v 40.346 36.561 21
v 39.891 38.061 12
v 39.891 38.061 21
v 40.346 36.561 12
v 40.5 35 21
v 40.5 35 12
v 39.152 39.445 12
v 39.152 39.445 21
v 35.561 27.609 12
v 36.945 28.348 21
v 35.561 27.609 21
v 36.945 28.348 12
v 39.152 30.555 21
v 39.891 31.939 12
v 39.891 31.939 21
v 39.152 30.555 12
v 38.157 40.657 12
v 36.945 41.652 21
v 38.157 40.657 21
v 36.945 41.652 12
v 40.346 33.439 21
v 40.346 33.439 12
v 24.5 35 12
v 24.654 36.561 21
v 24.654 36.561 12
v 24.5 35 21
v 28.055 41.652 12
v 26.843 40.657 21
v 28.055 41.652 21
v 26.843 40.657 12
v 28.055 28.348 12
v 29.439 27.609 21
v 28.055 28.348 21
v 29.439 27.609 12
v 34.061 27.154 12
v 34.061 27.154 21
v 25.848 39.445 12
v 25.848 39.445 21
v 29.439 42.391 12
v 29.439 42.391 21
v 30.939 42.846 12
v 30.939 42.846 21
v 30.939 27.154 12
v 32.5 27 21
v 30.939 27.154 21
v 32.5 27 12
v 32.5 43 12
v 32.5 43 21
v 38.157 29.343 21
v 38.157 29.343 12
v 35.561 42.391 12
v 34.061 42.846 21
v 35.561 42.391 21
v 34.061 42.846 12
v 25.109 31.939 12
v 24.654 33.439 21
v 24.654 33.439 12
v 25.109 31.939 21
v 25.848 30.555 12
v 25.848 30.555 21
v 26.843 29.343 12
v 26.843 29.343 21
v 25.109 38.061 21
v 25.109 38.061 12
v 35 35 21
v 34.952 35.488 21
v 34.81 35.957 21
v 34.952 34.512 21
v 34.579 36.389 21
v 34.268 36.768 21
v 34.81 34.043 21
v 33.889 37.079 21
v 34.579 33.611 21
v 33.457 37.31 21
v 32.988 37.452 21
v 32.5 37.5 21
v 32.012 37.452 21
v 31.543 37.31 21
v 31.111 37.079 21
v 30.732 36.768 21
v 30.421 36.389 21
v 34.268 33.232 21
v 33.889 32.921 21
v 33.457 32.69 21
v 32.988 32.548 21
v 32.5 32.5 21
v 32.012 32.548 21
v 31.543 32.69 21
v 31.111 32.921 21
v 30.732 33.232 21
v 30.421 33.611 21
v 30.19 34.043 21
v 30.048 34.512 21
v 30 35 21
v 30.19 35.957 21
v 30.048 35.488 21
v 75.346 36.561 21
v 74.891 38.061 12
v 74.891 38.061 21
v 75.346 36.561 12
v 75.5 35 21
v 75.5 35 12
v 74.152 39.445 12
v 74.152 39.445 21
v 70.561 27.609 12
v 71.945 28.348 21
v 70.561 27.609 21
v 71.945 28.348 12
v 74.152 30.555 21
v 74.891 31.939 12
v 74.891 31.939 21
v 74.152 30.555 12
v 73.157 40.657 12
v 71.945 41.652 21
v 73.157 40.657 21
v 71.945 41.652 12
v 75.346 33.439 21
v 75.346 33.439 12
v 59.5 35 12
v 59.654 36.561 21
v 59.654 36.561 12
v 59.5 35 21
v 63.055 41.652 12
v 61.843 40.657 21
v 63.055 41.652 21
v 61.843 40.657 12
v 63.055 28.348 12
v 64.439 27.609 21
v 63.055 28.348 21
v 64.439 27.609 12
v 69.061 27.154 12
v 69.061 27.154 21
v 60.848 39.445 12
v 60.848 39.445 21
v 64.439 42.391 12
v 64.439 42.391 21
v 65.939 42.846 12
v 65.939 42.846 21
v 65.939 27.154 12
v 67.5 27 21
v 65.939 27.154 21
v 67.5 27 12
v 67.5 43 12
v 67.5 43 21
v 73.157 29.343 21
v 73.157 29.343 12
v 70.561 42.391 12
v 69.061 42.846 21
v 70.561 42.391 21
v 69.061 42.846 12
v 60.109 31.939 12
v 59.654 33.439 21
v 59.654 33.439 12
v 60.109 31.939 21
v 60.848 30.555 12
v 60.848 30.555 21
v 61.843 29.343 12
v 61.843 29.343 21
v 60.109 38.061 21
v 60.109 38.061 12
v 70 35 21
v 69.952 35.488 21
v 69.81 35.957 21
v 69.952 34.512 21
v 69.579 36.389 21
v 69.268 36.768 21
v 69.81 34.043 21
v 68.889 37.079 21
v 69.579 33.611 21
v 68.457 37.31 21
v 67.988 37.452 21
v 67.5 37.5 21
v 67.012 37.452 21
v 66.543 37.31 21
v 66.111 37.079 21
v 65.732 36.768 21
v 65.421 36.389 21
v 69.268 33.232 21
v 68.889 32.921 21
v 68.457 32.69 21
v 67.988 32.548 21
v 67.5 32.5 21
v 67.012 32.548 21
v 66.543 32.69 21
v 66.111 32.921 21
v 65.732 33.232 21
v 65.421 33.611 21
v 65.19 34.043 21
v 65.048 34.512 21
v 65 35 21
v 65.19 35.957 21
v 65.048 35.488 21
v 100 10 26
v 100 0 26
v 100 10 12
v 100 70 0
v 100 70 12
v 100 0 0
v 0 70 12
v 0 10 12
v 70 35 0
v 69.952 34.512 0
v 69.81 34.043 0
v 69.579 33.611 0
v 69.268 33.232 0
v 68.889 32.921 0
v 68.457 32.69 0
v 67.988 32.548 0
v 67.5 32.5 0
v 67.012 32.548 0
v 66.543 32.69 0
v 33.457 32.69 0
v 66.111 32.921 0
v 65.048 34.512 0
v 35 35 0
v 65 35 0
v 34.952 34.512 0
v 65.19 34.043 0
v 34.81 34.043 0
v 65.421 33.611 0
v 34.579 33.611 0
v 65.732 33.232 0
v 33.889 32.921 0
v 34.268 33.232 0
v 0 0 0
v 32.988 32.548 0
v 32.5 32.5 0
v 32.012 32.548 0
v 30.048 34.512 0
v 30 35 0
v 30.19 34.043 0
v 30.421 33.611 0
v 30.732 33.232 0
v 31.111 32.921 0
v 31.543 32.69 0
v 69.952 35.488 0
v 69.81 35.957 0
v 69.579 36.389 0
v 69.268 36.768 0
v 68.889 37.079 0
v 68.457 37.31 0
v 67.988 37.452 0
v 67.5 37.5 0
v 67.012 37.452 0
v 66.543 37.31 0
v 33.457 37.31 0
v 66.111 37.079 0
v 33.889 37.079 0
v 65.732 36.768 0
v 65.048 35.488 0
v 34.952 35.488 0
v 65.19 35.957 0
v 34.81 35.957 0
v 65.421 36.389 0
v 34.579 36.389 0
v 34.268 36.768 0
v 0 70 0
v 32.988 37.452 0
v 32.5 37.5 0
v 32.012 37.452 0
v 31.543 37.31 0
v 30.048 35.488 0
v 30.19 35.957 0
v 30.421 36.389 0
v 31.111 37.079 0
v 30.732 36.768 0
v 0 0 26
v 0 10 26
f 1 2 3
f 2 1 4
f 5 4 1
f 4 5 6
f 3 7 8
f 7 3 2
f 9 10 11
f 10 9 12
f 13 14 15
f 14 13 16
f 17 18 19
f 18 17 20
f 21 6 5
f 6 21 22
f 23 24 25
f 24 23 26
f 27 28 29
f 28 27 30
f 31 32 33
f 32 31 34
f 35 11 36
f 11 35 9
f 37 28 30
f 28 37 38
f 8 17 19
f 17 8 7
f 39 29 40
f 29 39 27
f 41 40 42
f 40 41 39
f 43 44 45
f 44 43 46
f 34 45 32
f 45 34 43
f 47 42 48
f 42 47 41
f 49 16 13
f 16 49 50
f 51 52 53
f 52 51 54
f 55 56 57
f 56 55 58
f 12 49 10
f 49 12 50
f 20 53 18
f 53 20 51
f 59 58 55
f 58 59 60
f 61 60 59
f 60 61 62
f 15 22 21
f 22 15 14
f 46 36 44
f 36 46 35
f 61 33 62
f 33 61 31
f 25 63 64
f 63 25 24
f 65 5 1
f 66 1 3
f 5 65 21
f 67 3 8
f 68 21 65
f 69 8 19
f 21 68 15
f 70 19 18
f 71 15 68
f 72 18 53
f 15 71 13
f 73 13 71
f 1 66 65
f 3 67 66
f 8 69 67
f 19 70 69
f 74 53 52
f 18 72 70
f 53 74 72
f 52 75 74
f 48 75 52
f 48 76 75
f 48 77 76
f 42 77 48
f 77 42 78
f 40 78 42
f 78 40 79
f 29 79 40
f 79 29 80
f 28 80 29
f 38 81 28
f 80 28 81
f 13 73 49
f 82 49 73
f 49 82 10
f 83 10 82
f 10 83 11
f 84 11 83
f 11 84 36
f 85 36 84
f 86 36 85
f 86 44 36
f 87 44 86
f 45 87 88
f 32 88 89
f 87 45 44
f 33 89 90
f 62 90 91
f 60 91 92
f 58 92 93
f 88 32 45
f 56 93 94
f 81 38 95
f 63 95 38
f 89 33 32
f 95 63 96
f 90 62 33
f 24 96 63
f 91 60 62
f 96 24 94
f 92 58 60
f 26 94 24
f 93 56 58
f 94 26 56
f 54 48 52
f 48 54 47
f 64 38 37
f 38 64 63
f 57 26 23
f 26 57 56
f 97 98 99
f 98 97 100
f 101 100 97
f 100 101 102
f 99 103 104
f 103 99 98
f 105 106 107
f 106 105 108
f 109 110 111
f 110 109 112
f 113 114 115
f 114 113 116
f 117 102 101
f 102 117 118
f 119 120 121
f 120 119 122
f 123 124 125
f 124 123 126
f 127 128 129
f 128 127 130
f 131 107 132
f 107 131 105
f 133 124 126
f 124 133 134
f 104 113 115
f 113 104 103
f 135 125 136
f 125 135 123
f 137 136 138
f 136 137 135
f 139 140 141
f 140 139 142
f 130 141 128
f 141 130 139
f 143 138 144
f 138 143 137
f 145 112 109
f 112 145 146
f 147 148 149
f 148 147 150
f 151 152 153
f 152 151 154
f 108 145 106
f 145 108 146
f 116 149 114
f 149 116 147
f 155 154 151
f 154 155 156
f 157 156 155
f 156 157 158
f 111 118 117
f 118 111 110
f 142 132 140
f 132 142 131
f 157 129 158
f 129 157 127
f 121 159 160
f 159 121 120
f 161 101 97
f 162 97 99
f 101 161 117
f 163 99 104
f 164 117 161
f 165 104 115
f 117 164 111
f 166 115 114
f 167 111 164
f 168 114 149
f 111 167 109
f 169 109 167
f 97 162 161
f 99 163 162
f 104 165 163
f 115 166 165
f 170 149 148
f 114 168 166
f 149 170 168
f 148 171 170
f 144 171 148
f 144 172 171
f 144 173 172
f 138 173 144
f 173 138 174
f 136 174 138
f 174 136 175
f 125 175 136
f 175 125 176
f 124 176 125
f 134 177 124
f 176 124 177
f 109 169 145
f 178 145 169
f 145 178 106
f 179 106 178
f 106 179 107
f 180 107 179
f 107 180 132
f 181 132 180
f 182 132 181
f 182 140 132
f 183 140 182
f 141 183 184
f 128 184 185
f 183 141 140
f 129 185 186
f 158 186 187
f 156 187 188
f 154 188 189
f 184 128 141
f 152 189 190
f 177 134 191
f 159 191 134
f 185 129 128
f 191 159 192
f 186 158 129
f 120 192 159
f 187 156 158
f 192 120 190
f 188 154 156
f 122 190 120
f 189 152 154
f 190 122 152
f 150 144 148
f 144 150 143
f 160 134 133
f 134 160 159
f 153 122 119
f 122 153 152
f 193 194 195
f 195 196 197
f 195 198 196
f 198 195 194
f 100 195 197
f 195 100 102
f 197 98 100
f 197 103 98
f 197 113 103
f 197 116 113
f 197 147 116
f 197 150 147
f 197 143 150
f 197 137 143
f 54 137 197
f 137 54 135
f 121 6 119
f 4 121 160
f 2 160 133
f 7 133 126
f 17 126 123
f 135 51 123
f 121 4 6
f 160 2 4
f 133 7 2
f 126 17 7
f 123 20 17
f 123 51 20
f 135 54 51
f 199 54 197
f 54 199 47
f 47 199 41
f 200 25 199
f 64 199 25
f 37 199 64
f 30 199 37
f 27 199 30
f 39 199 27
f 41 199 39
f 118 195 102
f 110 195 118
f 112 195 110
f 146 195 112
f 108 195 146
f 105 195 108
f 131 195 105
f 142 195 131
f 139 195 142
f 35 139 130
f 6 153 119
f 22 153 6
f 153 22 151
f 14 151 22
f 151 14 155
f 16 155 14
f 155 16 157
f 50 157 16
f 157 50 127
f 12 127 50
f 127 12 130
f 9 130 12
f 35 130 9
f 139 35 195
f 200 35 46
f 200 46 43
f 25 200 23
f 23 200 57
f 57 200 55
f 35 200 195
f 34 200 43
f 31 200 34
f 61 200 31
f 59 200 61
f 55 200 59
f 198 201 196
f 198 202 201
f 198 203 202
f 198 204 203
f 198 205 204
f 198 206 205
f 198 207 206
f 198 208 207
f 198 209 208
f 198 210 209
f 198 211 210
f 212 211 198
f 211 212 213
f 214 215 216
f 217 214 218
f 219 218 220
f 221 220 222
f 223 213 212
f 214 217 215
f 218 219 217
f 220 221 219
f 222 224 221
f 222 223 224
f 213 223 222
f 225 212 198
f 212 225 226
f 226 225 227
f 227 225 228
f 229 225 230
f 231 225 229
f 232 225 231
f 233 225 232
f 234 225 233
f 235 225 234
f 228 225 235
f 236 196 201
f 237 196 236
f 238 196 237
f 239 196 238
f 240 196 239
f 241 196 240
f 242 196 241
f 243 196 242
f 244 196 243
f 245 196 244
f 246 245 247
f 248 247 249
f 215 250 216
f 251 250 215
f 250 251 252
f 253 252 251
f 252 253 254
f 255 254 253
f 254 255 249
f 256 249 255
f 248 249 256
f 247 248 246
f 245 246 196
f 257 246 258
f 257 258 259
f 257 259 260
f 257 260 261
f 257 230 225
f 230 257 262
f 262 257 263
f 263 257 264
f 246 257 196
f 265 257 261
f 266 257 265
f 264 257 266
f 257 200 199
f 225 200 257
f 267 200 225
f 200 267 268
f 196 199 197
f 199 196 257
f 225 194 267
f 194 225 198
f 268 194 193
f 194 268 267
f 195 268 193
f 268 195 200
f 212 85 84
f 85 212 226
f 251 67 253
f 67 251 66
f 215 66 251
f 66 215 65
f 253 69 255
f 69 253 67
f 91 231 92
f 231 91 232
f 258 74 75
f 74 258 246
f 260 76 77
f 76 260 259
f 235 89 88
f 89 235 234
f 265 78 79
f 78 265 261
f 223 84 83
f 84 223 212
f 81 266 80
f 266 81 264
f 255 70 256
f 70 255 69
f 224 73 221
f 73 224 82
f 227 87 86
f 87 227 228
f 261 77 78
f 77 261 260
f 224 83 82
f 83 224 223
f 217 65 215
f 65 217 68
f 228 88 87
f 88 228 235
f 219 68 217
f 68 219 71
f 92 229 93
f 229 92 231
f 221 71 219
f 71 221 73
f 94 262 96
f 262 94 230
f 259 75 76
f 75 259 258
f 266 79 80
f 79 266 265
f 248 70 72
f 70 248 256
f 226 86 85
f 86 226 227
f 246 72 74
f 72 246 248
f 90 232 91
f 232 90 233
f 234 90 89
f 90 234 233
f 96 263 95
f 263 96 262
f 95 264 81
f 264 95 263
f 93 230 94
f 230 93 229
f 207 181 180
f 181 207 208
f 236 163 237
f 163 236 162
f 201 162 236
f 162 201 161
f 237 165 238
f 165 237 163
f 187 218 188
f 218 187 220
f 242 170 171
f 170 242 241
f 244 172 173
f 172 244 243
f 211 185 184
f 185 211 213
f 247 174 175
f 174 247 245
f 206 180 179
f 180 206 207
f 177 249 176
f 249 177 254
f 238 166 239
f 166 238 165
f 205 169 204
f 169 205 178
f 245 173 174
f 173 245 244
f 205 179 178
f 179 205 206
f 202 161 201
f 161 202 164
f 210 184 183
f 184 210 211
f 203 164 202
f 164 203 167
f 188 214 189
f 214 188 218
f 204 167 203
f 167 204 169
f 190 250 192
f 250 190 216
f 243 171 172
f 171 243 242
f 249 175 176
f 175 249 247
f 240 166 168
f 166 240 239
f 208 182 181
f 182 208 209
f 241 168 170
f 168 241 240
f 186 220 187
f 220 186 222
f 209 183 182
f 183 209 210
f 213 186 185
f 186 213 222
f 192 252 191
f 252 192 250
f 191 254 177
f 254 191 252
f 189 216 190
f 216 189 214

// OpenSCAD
$fn = 32;

// ----------------------------------------------------------------------
// Drill jig: fence jig
// ----------------------------------------------------------------------

// --- parameters (mm) ---
plate_l = 100;            // plate length, X
plate_w = 70;             // plate width, Y
plate_t = 12;             // plate thickness
boss_d = 16;              // guide boss diameter
boss_h = 10;              // boss height above the plate
guide_d = 5;              // guide hole diameter
boss_pitch = 35;          // boss pitch
fence_h = 15;             // fence height above the plate
fence_t = 10;             // fence thickness

n_boss = 2;  // guide bosses
boss_x0 = (plate_l - (n_boss - 1) * boss_pitch) / 2;  // first boss X
boss_top = plate_t - 1 + boss_h;  // boss crown height
fence_top = plate_t - 1 + fence_h;  // fence crown height
total_h = max([fence_top, boss_top]);  // overall height

difference() {
  union() {
  cube([plate_l, plate_w, plate_t]);
  for (i = [0 : n_boss - 1])
    translate([boss_x0 + i * boss_pitch, plate_w / 2, plate_t - 1])
      cylinder(h = boss_h, d = boss_d);
  translate([0, 0, plate_t - 1]) cube([plate_l, fence_t, fence_h]);
  }
  for (i = [0 : n_boss - 1])
    translate([boss_x0 + i * boss_pitch, plate_w / 2, -1])
      cylinder(h = plate_t + boss_h, d = guide_d);
}
